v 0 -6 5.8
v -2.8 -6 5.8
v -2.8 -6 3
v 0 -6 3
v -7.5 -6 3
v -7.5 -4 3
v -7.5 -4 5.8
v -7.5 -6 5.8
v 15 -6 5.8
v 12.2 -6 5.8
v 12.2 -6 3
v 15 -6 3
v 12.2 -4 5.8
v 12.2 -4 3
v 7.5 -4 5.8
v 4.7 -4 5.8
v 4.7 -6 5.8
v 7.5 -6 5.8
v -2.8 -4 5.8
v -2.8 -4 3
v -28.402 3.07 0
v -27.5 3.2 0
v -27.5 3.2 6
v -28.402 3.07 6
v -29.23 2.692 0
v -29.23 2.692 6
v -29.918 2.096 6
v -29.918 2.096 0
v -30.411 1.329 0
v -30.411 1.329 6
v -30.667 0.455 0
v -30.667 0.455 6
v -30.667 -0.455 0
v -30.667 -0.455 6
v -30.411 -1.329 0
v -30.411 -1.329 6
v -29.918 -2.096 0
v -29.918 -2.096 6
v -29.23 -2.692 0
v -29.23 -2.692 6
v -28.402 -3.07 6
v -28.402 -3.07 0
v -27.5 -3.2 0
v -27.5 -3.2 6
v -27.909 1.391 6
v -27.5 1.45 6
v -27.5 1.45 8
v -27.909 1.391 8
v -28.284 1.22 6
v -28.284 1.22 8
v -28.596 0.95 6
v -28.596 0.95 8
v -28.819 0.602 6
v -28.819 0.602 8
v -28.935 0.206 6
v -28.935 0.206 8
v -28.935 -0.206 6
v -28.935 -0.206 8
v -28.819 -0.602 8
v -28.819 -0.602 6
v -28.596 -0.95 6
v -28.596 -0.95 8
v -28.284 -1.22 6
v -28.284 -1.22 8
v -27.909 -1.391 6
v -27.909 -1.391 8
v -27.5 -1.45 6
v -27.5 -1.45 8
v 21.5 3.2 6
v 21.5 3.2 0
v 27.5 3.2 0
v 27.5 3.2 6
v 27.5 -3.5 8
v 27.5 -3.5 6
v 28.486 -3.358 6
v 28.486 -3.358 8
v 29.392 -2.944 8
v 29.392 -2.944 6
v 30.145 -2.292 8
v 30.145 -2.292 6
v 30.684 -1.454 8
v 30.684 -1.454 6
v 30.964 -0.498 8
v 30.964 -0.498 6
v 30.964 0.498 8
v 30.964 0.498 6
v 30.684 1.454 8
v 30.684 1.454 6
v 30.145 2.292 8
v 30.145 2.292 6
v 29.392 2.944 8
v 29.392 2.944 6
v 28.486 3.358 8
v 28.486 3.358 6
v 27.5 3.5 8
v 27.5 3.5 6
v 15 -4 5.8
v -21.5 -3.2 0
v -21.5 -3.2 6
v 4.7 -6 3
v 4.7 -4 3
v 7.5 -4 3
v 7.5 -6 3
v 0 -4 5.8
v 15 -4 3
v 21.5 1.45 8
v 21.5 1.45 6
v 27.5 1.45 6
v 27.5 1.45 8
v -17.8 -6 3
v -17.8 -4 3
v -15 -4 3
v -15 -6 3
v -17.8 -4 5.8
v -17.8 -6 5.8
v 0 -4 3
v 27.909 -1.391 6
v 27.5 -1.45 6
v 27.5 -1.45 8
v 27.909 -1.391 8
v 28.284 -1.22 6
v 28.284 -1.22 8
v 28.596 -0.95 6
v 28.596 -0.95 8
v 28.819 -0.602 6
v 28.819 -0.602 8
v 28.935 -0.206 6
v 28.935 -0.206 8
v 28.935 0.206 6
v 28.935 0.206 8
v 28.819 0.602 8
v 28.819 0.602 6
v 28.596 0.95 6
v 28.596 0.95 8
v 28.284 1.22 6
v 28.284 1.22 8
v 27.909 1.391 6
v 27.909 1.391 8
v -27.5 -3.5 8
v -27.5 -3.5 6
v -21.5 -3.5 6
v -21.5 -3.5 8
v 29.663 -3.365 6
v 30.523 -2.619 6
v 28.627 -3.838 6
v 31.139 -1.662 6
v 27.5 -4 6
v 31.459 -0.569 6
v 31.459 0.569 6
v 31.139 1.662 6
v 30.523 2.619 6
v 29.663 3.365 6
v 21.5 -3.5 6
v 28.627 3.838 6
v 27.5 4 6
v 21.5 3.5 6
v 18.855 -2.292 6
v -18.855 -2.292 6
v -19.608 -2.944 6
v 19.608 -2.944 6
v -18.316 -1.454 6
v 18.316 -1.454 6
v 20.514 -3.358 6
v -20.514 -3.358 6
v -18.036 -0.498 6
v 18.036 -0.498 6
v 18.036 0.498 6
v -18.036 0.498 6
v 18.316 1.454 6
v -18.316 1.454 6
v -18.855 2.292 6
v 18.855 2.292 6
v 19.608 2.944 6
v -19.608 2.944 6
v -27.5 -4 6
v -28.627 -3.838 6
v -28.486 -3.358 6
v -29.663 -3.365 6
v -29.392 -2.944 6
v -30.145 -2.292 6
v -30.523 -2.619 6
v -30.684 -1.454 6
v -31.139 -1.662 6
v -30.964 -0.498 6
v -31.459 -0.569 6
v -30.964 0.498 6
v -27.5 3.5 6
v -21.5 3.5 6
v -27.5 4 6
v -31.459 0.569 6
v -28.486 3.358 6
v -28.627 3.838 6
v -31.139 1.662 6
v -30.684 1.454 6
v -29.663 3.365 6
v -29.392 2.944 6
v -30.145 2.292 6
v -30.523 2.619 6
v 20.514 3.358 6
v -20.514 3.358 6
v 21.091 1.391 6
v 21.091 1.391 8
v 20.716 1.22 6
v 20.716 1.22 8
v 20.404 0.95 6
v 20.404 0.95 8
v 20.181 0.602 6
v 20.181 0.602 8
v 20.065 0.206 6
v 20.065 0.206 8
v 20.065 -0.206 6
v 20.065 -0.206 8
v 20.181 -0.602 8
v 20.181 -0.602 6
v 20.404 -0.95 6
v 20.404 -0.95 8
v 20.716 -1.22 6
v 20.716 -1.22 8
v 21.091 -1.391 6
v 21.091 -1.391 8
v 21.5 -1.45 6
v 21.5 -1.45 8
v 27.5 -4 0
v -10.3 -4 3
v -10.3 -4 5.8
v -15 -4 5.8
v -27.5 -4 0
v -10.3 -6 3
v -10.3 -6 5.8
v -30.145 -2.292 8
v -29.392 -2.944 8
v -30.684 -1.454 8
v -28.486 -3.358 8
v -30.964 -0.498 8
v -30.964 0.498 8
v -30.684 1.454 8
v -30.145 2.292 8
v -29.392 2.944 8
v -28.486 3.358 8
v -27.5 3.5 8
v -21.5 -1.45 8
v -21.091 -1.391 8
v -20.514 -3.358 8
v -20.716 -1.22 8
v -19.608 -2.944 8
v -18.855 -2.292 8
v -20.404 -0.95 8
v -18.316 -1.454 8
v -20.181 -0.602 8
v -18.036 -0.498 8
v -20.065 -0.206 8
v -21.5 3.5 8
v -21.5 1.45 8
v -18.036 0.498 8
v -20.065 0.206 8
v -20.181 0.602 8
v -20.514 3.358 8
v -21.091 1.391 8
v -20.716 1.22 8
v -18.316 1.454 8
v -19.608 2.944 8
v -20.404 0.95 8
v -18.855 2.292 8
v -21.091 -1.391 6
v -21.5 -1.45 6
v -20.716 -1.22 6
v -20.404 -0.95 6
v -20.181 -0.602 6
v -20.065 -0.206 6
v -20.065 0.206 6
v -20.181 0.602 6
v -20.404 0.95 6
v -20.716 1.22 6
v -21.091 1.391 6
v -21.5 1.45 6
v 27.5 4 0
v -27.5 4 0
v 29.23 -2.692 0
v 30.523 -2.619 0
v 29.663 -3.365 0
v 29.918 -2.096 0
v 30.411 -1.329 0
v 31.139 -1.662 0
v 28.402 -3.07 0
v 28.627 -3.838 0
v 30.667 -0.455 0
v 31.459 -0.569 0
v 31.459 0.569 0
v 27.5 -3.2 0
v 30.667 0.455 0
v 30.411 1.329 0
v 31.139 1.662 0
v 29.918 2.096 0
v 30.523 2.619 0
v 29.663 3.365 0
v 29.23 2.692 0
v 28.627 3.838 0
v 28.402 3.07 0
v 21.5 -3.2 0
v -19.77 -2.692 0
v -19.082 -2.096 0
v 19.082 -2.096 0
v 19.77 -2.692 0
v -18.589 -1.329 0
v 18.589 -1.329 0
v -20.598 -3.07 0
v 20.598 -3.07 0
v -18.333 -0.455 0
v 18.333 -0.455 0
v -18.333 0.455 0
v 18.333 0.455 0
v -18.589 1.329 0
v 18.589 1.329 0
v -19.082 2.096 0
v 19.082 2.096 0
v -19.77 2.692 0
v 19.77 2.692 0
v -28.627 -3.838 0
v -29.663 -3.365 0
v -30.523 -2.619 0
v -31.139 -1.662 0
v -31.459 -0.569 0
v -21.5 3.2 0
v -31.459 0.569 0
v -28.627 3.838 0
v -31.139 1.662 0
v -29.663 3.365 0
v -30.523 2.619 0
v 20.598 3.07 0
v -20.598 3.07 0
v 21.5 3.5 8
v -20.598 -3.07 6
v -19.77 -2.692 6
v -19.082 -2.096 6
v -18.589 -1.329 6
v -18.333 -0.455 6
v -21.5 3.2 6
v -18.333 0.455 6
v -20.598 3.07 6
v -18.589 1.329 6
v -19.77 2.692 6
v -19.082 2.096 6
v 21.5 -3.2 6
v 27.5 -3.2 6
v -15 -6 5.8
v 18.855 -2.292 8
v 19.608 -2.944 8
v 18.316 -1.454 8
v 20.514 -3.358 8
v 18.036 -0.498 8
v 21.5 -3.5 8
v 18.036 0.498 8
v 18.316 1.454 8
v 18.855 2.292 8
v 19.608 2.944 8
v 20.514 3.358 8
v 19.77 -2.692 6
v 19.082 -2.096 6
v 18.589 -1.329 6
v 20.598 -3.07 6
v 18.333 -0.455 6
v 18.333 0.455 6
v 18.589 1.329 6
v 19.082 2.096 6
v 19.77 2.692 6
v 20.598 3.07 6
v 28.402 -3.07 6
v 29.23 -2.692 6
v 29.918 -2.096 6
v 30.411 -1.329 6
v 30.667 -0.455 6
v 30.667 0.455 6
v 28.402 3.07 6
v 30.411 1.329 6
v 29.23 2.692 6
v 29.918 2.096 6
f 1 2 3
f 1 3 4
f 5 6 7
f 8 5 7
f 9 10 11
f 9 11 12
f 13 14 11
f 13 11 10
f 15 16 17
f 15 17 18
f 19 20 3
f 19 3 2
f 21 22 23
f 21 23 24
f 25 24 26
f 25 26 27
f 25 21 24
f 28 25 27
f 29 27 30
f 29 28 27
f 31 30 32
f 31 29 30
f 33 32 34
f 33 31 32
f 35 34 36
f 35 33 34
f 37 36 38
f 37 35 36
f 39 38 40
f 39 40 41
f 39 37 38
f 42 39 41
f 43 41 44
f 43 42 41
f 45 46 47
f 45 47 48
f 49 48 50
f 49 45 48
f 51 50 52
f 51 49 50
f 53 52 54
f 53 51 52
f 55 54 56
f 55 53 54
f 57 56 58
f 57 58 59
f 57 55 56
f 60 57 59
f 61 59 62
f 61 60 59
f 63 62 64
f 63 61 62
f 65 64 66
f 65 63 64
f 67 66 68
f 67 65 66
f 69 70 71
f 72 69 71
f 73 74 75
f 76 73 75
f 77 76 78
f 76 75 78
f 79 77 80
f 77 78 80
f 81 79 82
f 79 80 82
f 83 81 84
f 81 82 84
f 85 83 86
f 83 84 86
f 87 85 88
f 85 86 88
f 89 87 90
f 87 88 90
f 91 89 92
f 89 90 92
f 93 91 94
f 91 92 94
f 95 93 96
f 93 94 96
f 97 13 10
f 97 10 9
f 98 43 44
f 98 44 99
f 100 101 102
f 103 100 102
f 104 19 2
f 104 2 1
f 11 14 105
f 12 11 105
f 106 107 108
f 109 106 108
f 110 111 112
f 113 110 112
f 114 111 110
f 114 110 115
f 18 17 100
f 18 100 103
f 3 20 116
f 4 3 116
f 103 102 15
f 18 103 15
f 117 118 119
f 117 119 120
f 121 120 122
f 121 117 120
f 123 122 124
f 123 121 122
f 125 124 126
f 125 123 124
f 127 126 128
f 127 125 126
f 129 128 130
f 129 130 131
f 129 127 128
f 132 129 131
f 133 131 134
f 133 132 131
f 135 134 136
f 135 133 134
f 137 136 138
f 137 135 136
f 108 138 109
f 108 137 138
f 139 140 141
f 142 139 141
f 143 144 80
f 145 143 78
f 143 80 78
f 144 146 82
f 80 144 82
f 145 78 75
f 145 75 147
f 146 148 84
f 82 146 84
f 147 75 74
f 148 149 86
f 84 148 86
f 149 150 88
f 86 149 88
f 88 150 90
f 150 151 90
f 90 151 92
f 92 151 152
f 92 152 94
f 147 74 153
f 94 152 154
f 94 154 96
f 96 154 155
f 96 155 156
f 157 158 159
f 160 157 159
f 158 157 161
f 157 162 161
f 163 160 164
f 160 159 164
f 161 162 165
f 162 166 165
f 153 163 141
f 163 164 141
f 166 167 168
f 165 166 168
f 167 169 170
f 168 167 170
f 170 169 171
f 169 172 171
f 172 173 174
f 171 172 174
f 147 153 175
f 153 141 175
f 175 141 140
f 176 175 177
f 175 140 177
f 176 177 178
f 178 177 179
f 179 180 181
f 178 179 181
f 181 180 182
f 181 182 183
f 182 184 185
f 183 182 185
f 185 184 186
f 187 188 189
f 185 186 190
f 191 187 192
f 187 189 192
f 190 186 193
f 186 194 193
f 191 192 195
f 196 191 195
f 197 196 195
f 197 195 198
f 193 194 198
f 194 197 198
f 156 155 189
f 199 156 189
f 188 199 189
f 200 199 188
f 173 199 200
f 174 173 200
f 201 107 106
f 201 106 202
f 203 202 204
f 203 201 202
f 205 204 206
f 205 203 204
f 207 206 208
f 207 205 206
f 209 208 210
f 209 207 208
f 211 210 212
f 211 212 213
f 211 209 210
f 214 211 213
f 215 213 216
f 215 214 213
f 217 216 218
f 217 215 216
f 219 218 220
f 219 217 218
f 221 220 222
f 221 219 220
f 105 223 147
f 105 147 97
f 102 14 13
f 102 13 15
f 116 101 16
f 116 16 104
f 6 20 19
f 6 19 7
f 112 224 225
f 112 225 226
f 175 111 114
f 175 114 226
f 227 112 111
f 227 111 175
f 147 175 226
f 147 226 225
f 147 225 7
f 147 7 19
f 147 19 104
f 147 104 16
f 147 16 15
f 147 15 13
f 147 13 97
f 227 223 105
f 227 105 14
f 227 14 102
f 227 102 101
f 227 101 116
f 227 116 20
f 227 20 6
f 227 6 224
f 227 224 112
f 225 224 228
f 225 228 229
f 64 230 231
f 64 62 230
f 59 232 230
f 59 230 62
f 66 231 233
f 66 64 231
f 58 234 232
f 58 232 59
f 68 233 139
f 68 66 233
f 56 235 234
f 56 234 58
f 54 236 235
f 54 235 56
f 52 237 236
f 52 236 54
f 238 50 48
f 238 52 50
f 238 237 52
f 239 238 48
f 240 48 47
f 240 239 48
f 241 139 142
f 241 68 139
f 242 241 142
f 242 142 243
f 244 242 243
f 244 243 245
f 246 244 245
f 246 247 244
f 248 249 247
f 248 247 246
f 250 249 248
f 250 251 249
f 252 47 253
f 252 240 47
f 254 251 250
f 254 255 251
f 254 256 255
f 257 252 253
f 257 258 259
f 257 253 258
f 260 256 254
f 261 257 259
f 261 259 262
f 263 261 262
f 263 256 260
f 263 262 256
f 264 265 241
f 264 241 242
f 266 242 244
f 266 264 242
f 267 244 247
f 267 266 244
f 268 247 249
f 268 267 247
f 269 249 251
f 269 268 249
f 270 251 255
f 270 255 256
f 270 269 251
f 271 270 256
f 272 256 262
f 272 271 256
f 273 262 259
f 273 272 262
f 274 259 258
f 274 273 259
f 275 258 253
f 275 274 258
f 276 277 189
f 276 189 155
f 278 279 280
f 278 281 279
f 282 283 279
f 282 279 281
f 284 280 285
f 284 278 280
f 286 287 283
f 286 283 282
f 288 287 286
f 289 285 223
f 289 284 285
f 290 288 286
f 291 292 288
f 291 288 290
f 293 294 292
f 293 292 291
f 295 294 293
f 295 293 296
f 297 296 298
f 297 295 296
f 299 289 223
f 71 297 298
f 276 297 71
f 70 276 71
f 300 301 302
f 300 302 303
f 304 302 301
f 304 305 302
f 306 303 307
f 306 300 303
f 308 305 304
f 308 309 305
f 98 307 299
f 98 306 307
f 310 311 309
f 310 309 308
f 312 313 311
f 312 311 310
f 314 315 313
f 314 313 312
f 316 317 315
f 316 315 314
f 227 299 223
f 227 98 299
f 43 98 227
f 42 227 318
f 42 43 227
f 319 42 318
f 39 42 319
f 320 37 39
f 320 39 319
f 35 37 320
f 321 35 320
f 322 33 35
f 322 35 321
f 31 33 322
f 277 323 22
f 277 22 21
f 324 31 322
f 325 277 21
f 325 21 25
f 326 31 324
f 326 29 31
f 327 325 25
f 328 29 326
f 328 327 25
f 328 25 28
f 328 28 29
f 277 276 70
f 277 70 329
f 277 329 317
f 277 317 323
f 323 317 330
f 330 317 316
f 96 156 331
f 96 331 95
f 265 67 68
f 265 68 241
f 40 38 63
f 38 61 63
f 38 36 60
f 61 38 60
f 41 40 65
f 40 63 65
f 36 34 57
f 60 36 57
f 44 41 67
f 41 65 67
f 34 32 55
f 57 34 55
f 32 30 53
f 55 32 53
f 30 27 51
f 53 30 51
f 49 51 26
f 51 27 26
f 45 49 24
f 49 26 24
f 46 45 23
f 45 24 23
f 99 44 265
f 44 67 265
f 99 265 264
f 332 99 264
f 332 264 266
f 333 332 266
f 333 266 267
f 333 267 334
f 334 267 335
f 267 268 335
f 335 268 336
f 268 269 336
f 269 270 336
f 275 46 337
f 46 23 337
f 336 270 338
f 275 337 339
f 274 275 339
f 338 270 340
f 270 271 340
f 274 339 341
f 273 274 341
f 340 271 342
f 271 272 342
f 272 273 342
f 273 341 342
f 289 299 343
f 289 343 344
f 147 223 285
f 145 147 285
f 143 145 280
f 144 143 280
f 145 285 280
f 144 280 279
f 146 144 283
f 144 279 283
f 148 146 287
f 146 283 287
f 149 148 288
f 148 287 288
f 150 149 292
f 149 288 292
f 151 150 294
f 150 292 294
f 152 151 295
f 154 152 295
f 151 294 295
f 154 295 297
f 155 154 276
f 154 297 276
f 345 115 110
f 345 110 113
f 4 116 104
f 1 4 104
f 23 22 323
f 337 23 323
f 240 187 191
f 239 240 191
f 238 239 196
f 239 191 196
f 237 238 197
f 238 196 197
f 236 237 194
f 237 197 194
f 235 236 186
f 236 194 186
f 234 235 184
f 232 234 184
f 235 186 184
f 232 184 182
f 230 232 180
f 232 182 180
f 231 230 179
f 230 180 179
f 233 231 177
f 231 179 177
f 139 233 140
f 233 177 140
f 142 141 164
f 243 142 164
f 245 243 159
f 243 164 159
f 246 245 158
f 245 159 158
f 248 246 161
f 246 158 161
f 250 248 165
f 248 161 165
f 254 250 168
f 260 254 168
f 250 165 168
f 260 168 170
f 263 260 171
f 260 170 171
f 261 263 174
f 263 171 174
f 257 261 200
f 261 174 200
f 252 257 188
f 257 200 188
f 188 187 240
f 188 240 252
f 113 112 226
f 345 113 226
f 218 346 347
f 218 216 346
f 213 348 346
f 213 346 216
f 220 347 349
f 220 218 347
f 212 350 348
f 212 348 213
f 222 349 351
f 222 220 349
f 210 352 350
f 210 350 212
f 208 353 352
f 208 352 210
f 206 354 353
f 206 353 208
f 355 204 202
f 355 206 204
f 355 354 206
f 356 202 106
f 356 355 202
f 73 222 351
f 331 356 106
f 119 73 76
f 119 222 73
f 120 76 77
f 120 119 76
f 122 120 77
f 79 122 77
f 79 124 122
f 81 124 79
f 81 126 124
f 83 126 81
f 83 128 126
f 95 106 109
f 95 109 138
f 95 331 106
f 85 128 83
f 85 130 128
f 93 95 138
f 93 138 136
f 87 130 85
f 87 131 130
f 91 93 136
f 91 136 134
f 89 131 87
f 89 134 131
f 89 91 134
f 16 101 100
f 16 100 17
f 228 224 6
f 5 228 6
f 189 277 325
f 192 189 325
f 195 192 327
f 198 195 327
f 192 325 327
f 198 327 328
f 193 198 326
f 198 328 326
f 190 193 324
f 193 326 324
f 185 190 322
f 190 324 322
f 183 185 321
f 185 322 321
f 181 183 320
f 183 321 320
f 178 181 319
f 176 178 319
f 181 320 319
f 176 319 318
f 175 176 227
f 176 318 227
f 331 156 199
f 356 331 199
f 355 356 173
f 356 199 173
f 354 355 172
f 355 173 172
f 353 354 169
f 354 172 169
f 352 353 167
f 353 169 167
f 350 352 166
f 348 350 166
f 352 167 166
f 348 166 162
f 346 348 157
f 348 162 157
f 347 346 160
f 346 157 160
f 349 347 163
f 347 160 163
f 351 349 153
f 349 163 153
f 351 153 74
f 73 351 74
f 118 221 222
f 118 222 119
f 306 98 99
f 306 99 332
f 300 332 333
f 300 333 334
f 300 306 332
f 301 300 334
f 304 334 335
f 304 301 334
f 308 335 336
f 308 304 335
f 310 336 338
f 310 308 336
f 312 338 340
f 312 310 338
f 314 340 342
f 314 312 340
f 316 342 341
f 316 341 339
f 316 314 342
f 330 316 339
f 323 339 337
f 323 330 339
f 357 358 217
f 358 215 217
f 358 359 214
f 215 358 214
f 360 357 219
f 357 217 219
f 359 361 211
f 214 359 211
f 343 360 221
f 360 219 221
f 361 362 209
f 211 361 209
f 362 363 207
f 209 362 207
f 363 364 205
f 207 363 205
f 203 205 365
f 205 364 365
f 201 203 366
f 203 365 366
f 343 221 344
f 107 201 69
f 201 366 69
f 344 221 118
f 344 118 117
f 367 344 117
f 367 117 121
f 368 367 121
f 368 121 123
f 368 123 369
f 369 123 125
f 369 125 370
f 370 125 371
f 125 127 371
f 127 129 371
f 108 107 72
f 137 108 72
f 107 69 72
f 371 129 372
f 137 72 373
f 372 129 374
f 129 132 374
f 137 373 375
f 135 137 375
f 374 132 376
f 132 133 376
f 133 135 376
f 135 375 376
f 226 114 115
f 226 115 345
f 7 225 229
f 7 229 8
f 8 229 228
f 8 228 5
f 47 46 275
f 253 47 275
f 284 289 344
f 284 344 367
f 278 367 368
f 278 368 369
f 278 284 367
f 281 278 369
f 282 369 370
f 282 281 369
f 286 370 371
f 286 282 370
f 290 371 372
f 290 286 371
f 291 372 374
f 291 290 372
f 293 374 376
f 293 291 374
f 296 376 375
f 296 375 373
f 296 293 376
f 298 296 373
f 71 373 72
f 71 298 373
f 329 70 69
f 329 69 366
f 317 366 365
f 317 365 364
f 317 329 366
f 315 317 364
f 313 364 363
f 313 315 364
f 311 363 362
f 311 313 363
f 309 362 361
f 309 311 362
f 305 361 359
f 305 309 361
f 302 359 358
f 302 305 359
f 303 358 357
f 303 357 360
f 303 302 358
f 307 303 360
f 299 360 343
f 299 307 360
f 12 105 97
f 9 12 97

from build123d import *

# Parameters (mm, degrees)
PAD_DEPTH           = 6
PAD001_DEPTH        = 2
SKETCH002_W         = 2.8
SKETCH002_H         = 2.8
PAD002_DEPTH        = 2
LINEARPATTERN_COUNT = 5
LINEARPATTERN_PITCH = 7.5


with BuildPart() as part:
    # Sketch → Pad (new body)
    with BuildSketch(Plane.XY):
        with BuildLine():
            Line((-27.5, 4), (27.5, 4))
            ThreePointArc((27.5, -4), (31.5, 0), (27.5, 4))
            Line((27.5, -4), (-27.5, -4))
            ThreePointArc((-27.5, 4), (-31.5, 0), (-27.5, -4))
        make_face()
        with BuildLine():
            ThreePointArc((-27.5, 3.2), (-30.7, 0), (-27.5, -3.2))
            Line((-27.5, -3.2), (-21.5, -3.2))
            ThreePointArc((-21.5, -3.2), (-18.3, 0), (-21.5, 3.2))
            Line((-27.5, 3.2), (-21.5, 3.2))
        make_face(mode=Mode.SUBTRACT)
        with BuildLine():
            ThreePointArc((21.5, 3.2), (18.3, 0), (21.5, -3.2))
            Line((21.5, -3.2), (27.5, -3.2))
            ThreePointArc((27.5, -3.2), (30.7, 0), (27.5, 3.2))
            Line((21.5, 3.2), (27.5, 3.2))
        make_face(mode=Mode.SUBTRACT)
    extrude(amount=PAD_DEPTH)

    # Sketch001 → Pad001 (new body)
    with BuildSketch(Plane.XY.offset(6)):
        with BuildLine():
            ThreePointArc((-27.5, 3.5), (-31, 0), (-27.5, -3.5))
            Line((-27.5, -3.5), (-21.5, -3.5))
            ThreePointArc((-21.5, -3.5), (-18, 0), (-21.5, 3.5))
            Line((-27.5, 3.5), (-21.5, 3.5))
        make_face()
        with BuildLine():
            ThreePointArc((-27.5, 1.45), (-28.95, 0), (-27.5, -1.45))
            Line((-27.5, -1.45), (-21.5, -1.45))
            ThreePointArc((-21.5, -1.45), (-20.05, 0), (-21.5, 1.45))
            Line((-27.5, 1.45), (-21.5, 1.45))
        make_face(mode=Mode.SUBTRACT)
        with BuildLine():
            ThreePointArc((21.5, 3.5), (18, 0), (21.5, -3.5))
            Line((21.5, -3.5), (27.499981, -3.5))
            ThreePointArc((27.499981, -3.5), (31, -9e-06), (27.5, 3.5))
            Line((21.5, 3.5), (27.5, 3.5))
        make_face()
        with BuildLine():
            ThreePointArc((21.5, 1.45), (20.05, 0), (21.5, -1.45))
            Line((21.5, -1.45), (27.5, -1.45))
            ThreePointArc((27.5, -1.45), (28.95, 0), (27.5, 1.45))
            Line((21.5, 1.45), (27.5, 1.45))
        make_face(mode=Mode.SUBTRACT)
    extrude(amount=PAD001_DEPTH)

    # Sketch002 → Pad002 (new body)
    with BuildSketch(Plane.XZ.offset(4)):
        with Locations((13.6, 4.4)):
            Rectangle(SKETCH002_W, SKETCH002_H)
    pad002 = extrude(amount=PAD002_DEPTH)

    # LinearPattern: Pad002 ×5
    with Locations(*[(-i * LINEARPATTERN_PITCH, 0, 0) for i in range(1, LINEARPATTERN_COUNT)]):
        add(pad002)


solid = part.part
